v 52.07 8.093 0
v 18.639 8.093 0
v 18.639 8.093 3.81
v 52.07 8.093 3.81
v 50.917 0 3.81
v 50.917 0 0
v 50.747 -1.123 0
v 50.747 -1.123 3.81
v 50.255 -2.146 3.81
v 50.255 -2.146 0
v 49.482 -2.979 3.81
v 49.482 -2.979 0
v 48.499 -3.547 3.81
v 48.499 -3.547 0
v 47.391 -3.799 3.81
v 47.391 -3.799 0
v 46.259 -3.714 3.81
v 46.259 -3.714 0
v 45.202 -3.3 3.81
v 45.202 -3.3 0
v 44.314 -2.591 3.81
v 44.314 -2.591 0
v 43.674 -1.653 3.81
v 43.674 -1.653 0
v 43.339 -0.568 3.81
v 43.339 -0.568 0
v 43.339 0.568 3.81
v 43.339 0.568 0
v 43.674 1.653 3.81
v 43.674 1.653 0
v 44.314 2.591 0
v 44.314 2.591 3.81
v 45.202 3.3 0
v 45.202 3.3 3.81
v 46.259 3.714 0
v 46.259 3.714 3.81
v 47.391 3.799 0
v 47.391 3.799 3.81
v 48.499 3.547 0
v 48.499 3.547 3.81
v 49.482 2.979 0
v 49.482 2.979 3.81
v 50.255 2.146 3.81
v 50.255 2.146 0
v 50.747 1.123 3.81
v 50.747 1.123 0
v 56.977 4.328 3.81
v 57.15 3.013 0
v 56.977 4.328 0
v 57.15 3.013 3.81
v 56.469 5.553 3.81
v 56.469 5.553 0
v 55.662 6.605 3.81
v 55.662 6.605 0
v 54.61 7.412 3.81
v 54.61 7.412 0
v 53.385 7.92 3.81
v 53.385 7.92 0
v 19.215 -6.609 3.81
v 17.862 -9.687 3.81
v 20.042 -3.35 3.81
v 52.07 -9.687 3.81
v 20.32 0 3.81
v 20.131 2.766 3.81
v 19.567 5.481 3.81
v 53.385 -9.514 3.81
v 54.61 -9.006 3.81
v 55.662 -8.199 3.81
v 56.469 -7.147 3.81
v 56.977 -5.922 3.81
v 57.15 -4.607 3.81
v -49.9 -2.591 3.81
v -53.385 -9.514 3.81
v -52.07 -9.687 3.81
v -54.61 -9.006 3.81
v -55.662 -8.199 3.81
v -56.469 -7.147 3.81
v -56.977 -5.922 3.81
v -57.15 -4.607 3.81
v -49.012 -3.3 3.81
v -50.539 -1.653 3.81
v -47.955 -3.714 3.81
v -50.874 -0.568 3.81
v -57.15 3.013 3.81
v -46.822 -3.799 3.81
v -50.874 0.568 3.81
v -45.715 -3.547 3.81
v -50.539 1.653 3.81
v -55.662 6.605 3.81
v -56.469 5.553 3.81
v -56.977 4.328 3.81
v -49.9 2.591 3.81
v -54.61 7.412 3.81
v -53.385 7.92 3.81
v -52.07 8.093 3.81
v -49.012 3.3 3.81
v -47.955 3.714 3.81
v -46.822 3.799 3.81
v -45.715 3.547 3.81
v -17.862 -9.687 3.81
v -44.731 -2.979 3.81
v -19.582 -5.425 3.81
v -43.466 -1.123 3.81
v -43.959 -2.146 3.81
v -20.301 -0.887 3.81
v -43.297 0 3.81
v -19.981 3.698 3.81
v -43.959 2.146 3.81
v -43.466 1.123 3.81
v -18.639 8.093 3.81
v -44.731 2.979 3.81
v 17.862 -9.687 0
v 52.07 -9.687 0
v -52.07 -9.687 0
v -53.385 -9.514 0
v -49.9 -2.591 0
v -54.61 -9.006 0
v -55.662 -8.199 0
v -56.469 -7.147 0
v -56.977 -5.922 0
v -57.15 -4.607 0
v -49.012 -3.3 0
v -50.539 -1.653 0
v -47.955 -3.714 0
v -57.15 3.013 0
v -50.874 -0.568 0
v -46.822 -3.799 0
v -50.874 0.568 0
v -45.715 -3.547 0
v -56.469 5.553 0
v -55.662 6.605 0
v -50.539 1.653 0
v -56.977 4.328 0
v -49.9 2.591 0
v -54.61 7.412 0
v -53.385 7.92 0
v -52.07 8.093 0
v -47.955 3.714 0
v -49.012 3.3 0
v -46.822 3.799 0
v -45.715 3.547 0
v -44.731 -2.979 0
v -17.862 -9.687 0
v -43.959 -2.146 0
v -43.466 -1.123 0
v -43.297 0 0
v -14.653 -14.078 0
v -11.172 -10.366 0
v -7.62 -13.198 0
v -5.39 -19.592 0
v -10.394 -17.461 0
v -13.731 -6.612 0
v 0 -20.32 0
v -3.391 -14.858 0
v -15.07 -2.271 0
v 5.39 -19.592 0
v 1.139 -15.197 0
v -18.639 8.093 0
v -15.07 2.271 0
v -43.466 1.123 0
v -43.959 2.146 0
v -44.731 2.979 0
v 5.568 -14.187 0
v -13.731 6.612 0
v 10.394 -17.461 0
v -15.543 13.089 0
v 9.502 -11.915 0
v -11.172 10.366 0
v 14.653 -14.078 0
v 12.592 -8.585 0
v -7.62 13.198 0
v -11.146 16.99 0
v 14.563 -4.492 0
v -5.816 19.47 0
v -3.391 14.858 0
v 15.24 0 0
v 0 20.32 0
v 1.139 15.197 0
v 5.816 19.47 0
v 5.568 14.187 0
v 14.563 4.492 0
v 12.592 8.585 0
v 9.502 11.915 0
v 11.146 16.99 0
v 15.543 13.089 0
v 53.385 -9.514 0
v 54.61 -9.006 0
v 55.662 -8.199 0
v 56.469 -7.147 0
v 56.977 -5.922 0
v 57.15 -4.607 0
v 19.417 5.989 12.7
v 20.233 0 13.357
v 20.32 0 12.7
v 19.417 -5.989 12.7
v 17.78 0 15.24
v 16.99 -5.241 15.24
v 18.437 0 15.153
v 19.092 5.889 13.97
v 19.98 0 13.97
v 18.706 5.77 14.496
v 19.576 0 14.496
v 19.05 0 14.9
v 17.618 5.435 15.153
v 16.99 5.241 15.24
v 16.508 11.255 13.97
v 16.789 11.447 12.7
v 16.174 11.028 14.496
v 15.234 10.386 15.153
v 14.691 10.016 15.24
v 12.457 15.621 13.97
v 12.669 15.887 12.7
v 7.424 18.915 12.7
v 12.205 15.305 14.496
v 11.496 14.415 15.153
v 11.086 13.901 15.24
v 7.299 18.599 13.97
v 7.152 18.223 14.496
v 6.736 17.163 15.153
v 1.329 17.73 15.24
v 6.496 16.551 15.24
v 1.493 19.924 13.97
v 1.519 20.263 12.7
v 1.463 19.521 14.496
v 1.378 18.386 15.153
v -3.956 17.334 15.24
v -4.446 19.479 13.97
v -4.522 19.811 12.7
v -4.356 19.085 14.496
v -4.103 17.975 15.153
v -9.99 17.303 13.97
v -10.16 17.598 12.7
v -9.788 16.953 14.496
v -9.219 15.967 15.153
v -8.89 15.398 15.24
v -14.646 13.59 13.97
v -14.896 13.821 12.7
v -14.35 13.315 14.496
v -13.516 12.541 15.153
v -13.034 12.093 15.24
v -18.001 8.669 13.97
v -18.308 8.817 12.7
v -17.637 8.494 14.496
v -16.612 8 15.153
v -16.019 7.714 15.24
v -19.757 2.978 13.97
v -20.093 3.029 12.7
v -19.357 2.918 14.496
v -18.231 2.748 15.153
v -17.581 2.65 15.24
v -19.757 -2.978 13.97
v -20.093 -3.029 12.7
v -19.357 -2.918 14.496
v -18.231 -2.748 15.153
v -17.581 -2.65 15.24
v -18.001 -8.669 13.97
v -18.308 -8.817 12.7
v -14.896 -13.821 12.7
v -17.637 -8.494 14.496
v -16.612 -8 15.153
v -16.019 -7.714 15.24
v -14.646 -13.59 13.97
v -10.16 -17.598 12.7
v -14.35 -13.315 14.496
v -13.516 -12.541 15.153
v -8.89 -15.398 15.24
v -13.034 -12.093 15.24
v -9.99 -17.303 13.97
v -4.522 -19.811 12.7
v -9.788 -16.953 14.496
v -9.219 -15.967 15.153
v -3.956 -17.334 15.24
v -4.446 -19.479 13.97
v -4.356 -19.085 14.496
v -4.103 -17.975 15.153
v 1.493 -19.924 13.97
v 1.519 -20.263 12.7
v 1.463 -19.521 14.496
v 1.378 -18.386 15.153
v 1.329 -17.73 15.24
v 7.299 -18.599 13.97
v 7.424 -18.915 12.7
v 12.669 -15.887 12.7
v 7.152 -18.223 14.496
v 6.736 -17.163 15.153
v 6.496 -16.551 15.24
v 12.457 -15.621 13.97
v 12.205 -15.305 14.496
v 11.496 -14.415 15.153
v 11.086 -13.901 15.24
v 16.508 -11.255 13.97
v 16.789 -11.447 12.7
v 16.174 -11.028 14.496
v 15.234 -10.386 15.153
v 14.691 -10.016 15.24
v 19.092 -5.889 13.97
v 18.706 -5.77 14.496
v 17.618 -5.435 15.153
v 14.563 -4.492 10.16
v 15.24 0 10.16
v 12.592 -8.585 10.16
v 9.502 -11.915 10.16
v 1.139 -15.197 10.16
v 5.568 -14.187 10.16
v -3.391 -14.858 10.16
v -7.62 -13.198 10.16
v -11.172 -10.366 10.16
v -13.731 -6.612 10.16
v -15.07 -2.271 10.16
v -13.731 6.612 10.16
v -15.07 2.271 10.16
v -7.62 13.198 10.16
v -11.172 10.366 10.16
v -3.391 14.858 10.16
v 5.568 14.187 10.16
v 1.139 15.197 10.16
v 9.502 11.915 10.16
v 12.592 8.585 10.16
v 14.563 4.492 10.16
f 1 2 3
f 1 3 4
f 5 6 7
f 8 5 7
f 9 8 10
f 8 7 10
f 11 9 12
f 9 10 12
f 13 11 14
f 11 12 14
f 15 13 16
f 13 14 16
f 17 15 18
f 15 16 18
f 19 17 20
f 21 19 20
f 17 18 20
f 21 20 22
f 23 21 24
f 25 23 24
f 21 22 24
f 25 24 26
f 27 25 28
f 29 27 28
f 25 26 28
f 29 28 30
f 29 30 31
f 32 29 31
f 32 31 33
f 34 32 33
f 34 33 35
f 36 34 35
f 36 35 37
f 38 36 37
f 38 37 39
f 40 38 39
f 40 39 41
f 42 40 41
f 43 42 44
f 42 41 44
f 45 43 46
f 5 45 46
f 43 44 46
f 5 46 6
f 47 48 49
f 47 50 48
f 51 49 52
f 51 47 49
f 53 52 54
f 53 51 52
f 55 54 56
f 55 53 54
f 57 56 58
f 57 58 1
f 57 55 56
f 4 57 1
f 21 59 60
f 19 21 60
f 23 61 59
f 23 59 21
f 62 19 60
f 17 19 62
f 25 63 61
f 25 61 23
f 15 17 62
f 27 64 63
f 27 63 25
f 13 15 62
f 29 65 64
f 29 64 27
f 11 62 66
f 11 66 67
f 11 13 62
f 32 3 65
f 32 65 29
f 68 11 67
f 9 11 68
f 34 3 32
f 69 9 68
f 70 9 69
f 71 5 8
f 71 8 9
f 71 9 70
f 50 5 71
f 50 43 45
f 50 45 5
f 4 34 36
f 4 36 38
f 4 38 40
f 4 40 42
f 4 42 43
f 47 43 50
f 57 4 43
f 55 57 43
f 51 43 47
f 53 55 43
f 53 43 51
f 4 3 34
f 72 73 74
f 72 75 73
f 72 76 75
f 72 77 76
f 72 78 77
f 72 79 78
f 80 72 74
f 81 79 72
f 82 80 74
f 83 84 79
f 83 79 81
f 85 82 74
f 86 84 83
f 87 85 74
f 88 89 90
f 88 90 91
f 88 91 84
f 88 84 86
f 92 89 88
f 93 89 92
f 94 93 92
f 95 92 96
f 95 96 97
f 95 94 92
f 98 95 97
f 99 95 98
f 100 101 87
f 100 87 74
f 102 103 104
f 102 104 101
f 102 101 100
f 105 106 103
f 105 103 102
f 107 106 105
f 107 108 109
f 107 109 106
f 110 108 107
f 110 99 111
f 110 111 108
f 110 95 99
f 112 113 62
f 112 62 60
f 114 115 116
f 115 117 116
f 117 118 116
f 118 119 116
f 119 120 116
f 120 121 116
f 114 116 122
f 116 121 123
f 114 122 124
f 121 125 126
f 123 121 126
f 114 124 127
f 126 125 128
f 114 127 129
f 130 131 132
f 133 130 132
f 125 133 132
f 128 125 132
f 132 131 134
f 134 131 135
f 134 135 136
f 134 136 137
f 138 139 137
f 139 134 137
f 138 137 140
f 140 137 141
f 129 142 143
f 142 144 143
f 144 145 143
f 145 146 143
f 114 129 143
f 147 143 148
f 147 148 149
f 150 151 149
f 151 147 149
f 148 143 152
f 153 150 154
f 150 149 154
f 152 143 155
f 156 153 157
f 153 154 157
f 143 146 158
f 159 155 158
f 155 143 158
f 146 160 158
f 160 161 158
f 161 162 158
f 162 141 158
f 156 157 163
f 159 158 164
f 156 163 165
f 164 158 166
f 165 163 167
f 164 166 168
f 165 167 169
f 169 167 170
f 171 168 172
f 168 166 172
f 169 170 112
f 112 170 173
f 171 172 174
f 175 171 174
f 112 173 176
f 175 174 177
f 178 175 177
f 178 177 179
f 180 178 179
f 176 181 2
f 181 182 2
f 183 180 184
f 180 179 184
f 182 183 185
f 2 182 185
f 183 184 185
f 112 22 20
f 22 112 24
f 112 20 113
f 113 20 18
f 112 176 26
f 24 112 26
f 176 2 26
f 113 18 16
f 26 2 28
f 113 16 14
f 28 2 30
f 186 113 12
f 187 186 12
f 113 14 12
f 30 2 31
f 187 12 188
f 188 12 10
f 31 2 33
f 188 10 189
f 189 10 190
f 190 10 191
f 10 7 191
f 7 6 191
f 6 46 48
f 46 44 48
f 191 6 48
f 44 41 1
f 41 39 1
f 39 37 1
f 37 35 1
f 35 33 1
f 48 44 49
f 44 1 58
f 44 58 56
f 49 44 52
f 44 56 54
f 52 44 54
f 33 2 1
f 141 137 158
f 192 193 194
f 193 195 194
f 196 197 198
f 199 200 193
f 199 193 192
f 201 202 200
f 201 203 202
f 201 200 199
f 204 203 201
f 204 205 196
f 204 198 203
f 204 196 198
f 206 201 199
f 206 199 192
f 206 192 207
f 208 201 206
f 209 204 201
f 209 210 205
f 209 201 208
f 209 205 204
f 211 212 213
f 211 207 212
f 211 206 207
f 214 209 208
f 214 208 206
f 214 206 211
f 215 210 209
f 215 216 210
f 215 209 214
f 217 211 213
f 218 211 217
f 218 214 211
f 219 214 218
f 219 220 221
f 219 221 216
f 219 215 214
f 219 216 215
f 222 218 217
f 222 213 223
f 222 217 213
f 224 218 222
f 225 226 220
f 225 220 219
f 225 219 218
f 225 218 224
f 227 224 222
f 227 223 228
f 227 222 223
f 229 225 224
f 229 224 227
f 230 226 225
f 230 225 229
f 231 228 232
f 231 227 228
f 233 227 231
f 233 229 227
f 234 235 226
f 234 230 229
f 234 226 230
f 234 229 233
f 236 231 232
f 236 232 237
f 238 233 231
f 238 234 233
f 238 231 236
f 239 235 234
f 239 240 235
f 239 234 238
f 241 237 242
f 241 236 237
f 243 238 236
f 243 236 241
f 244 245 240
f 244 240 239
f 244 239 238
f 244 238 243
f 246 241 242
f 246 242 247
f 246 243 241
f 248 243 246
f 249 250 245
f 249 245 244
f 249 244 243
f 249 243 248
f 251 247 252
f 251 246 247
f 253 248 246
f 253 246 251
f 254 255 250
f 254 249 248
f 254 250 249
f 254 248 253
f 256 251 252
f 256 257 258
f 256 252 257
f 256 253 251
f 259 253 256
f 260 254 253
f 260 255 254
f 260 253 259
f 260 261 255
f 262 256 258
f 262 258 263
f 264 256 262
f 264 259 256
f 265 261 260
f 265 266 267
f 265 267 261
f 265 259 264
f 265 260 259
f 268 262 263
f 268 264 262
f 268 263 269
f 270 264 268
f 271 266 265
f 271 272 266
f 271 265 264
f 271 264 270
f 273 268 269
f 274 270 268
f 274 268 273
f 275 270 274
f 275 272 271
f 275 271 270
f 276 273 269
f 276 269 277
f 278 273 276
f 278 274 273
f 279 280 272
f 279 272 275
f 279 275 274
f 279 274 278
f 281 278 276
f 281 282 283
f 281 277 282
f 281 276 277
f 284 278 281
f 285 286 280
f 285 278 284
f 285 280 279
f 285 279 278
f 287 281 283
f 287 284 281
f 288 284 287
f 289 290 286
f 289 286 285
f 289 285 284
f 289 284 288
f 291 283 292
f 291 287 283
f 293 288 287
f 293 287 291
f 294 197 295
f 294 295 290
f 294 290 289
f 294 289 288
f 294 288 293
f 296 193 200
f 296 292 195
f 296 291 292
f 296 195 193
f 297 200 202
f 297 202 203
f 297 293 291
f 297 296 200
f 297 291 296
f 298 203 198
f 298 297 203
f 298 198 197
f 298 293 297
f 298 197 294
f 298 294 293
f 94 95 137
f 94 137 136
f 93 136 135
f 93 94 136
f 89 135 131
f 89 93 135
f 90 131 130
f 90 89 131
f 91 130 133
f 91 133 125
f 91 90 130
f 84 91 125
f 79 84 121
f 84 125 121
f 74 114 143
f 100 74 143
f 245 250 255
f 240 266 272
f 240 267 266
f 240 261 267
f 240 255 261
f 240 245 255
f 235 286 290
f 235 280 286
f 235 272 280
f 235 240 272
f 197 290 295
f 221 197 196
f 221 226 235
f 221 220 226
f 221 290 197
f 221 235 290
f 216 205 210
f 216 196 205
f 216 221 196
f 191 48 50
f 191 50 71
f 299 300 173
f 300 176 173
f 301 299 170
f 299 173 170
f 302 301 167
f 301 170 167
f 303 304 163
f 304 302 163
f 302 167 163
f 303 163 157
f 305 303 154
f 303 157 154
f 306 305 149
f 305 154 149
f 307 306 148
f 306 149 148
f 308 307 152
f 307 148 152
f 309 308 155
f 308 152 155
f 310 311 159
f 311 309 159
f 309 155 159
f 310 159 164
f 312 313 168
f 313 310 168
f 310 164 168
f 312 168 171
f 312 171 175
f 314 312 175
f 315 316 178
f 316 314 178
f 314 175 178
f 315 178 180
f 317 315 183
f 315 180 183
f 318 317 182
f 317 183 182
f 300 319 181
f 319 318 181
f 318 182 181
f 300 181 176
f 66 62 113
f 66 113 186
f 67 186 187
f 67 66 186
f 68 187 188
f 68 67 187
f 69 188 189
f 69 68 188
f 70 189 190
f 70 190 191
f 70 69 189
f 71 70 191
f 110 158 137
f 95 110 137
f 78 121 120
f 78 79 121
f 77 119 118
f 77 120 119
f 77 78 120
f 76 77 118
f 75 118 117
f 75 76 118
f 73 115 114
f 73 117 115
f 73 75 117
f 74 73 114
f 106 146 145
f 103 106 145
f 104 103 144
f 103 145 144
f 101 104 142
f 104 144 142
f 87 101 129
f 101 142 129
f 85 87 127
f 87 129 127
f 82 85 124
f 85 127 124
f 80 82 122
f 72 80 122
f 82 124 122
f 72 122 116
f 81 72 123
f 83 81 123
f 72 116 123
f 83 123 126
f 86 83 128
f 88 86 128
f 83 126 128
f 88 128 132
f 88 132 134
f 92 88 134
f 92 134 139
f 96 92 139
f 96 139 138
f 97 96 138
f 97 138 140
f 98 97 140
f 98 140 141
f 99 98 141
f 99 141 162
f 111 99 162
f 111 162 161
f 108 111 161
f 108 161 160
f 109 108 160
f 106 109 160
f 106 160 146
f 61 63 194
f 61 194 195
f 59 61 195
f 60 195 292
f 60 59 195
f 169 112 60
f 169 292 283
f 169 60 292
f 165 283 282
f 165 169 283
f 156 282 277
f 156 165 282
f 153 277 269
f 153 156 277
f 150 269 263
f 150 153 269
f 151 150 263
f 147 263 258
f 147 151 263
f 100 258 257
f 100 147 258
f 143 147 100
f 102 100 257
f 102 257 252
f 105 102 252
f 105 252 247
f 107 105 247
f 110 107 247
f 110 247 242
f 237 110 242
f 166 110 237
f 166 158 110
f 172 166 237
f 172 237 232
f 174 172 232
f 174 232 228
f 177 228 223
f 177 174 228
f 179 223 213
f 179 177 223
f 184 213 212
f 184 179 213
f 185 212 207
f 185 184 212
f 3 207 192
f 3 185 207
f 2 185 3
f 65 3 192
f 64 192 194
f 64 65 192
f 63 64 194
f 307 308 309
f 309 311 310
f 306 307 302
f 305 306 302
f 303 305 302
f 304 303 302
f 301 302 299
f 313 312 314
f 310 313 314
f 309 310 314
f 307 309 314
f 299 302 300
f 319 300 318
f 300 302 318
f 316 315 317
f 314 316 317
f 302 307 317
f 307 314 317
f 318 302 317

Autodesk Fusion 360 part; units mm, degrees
sketch "Sketch1" plane through (0, 0, 0) normal (0, 0, 1) x (1, 0, 0)
  circle A0 centre (0, 0) radius 15.24
  circle A1 centre (0, 0) radius 20.32
  line L0 (18.6388, 8.093) -> (57.15, 8.093)
  line L1 (57.15, 8.093) -> (57.15, -9.687)
  line L2 (57.15, -9.687) -> (17.8624, -9.687)
  line L3 (0, 15.24) -> (0, -15.24) construction
  line L4 (-18.6388, 8.093) -> (-57.15, 8.093)
  line L5 (-57.15, 8.093) -> (-57.15, -9.687)
  line L6 (-57.15, -9.687) -> (-17.8624, -9.687)
  circle A2 centre (-47.1067, 0) radius 3.81
  circle A3 centre (47.1067, 0) radius 3.81
  dimension "d1" = 30.48
  dimension "d2" = 5.08
  dimension "d3" = 57.15
  dimension "d4" = 17.78
  dimension "d11" = 7.62
extrude "Extrude1" add sketch "Sketch1" along normal blind 15.24 contours A0 | A1
extrude "Extrude2" add sketch "Sketch1" along normal blind 3.81 contours A1 L0 L1 L2 | A1 L4 L5 L6 | A2 | A3
fillet "Fillet1" radius 5.08 4 edges at (57.15, 8.093, 1.905) (57.15, -9.687, 1.905) (-57.15, 8.093, 1.905) (-57.15, -9.687, 1.905)
extrude "Extrude3" cut sketch "Sketch1" along normal blind 5.08 contours A2 | A3
extrude "Extrude4" cut sketch "Sketch1" along normal blind 10.16 contours A0
fillet "Fillet2" radius 2.54 1 edges at (-18.9449, -7.348, 15.24)
